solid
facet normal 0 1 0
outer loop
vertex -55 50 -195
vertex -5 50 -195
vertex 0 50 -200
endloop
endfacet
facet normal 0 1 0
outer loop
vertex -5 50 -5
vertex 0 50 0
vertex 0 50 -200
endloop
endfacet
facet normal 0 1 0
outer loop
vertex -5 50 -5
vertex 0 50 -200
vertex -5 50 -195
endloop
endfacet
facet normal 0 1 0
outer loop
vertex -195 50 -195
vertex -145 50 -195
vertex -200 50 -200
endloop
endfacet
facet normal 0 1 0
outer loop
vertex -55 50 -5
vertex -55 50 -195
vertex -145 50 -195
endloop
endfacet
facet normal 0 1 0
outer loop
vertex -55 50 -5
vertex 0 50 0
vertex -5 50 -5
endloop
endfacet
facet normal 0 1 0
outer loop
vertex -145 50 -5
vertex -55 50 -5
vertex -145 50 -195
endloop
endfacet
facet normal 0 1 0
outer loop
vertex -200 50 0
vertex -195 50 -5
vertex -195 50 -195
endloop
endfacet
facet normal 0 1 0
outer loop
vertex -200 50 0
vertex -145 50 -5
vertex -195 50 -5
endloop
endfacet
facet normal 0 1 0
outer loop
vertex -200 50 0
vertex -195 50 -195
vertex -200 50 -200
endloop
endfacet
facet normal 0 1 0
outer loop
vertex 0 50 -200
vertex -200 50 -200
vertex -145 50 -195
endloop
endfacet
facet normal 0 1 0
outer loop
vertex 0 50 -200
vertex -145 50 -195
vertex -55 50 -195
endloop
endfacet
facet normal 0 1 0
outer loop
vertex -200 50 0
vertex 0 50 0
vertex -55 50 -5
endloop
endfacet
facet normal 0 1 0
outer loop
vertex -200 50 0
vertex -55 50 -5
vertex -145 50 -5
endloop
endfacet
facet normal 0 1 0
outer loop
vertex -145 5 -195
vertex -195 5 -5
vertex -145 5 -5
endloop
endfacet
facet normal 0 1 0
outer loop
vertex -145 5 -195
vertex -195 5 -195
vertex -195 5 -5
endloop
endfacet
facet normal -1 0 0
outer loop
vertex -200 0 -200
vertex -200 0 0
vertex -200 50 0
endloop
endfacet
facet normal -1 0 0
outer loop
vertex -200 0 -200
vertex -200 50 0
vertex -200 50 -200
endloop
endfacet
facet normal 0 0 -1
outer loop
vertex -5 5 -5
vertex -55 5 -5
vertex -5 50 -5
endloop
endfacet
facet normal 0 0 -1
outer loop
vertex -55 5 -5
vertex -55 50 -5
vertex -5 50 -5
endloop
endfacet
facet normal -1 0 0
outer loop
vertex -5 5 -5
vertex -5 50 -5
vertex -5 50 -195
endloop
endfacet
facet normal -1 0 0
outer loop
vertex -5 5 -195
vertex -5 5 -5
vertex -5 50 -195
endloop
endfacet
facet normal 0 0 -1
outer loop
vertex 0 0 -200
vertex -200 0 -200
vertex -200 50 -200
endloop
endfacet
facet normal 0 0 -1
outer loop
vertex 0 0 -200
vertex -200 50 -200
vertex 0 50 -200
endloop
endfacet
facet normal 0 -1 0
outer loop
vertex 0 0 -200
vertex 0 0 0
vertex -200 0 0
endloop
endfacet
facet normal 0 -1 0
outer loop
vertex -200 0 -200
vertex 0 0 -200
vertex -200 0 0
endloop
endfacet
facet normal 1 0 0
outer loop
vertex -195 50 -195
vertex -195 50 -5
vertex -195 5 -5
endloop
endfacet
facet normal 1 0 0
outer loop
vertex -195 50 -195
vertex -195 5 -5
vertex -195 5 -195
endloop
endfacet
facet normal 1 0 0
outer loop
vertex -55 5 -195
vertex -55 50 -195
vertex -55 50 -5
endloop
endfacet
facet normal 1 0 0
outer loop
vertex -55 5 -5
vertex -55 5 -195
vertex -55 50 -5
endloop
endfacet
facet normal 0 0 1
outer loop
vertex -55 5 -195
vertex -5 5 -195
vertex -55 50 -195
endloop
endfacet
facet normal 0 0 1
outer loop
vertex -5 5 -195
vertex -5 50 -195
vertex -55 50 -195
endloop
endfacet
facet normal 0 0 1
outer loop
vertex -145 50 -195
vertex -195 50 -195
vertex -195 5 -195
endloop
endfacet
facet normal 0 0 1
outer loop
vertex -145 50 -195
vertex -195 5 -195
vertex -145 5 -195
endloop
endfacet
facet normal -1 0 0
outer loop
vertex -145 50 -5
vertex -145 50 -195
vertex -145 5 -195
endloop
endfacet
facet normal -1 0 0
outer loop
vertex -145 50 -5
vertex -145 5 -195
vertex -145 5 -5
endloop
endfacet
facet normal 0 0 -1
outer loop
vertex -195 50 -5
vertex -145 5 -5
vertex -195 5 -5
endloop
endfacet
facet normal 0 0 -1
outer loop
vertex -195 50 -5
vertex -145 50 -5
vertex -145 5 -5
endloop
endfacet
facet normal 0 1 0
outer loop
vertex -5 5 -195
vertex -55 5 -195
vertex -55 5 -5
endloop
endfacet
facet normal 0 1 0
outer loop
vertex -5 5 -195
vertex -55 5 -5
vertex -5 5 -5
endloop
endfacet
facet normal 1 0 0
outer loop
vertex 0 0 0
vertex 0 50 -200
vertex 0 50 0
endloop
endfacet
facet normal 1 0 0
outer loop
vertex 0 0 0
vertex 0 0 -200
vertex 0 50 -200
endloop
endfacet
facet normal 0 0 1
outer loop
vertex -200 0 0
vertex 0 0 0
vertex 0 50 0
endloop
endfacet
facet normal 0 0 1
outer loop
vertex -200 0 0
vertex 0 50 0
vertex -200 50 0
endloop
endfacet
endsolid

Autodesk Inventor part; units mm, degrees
ref_plane "YZ Plane" through (0, 0, 0) normal (1, 0, 0) x (0, 1, 0)
ref_plane "XZ Plane" through (0, 0, 0) normal (0, 1, 0) x (-1, 0, 0)
ref_plane "XY Plane" through (0, 0, 0) normal (0, 0, 1) x (1, 0, 0)
sketch "Sketch1" plane through (0, 0, 0) normal (0, 1, 0) x (-1, 0, 0)
  line L0 (0, 0) -> (200, 0)
  line L1 (200, 0) -> (200, -200)
  line L2 (200, -200) -> (0, -200)
  line L3 (0, -200) -> (0, 0)
  dimension "d0" = 200
  dimension "d1" = 200
extrude "Extrusion1" add sketch "Sketch1" along normal blind 50
sketch "Sketch2" plane through (0, 50, 0) normal (0, 1, 0) x (1, 0, 0)
  line L0 (-5, 5) -> (-5, 195)
  line L1 (0, 200) -> (-200, 200) projected
  line L2 (-5, 195) -> (-55, 195)
  line L3 (-55, 195) -> (-55, 5)
  line L4 (-55, 5) -> (-5, 5)
  line L5 (-200, 200) -> (-200, 0) projected
  line L6 (-195, 195) -> (-145, 195)
  line L7 (-145, 195) -> (-145, 5)
  line L8 (-145, 5) -> (-195, 5)
  line L9 (-195, 5) -> (-195, 195)
  point P0 (0, 0)
  dimension "d4" = 190
  dimension "d5" = 50
  dimension "d16" = 50
  dimension "d17" = 190
  dimension "d20" = 5
extrude "Extrusion2" cut sketch "Sketch2" against normal blind 45 contours L4 L3 L2 L0
extrude "Extrusión4" cut sketch "Sketch2" against normal blind 45 contours L6 L7 L8 L9
properties part number "Box"
